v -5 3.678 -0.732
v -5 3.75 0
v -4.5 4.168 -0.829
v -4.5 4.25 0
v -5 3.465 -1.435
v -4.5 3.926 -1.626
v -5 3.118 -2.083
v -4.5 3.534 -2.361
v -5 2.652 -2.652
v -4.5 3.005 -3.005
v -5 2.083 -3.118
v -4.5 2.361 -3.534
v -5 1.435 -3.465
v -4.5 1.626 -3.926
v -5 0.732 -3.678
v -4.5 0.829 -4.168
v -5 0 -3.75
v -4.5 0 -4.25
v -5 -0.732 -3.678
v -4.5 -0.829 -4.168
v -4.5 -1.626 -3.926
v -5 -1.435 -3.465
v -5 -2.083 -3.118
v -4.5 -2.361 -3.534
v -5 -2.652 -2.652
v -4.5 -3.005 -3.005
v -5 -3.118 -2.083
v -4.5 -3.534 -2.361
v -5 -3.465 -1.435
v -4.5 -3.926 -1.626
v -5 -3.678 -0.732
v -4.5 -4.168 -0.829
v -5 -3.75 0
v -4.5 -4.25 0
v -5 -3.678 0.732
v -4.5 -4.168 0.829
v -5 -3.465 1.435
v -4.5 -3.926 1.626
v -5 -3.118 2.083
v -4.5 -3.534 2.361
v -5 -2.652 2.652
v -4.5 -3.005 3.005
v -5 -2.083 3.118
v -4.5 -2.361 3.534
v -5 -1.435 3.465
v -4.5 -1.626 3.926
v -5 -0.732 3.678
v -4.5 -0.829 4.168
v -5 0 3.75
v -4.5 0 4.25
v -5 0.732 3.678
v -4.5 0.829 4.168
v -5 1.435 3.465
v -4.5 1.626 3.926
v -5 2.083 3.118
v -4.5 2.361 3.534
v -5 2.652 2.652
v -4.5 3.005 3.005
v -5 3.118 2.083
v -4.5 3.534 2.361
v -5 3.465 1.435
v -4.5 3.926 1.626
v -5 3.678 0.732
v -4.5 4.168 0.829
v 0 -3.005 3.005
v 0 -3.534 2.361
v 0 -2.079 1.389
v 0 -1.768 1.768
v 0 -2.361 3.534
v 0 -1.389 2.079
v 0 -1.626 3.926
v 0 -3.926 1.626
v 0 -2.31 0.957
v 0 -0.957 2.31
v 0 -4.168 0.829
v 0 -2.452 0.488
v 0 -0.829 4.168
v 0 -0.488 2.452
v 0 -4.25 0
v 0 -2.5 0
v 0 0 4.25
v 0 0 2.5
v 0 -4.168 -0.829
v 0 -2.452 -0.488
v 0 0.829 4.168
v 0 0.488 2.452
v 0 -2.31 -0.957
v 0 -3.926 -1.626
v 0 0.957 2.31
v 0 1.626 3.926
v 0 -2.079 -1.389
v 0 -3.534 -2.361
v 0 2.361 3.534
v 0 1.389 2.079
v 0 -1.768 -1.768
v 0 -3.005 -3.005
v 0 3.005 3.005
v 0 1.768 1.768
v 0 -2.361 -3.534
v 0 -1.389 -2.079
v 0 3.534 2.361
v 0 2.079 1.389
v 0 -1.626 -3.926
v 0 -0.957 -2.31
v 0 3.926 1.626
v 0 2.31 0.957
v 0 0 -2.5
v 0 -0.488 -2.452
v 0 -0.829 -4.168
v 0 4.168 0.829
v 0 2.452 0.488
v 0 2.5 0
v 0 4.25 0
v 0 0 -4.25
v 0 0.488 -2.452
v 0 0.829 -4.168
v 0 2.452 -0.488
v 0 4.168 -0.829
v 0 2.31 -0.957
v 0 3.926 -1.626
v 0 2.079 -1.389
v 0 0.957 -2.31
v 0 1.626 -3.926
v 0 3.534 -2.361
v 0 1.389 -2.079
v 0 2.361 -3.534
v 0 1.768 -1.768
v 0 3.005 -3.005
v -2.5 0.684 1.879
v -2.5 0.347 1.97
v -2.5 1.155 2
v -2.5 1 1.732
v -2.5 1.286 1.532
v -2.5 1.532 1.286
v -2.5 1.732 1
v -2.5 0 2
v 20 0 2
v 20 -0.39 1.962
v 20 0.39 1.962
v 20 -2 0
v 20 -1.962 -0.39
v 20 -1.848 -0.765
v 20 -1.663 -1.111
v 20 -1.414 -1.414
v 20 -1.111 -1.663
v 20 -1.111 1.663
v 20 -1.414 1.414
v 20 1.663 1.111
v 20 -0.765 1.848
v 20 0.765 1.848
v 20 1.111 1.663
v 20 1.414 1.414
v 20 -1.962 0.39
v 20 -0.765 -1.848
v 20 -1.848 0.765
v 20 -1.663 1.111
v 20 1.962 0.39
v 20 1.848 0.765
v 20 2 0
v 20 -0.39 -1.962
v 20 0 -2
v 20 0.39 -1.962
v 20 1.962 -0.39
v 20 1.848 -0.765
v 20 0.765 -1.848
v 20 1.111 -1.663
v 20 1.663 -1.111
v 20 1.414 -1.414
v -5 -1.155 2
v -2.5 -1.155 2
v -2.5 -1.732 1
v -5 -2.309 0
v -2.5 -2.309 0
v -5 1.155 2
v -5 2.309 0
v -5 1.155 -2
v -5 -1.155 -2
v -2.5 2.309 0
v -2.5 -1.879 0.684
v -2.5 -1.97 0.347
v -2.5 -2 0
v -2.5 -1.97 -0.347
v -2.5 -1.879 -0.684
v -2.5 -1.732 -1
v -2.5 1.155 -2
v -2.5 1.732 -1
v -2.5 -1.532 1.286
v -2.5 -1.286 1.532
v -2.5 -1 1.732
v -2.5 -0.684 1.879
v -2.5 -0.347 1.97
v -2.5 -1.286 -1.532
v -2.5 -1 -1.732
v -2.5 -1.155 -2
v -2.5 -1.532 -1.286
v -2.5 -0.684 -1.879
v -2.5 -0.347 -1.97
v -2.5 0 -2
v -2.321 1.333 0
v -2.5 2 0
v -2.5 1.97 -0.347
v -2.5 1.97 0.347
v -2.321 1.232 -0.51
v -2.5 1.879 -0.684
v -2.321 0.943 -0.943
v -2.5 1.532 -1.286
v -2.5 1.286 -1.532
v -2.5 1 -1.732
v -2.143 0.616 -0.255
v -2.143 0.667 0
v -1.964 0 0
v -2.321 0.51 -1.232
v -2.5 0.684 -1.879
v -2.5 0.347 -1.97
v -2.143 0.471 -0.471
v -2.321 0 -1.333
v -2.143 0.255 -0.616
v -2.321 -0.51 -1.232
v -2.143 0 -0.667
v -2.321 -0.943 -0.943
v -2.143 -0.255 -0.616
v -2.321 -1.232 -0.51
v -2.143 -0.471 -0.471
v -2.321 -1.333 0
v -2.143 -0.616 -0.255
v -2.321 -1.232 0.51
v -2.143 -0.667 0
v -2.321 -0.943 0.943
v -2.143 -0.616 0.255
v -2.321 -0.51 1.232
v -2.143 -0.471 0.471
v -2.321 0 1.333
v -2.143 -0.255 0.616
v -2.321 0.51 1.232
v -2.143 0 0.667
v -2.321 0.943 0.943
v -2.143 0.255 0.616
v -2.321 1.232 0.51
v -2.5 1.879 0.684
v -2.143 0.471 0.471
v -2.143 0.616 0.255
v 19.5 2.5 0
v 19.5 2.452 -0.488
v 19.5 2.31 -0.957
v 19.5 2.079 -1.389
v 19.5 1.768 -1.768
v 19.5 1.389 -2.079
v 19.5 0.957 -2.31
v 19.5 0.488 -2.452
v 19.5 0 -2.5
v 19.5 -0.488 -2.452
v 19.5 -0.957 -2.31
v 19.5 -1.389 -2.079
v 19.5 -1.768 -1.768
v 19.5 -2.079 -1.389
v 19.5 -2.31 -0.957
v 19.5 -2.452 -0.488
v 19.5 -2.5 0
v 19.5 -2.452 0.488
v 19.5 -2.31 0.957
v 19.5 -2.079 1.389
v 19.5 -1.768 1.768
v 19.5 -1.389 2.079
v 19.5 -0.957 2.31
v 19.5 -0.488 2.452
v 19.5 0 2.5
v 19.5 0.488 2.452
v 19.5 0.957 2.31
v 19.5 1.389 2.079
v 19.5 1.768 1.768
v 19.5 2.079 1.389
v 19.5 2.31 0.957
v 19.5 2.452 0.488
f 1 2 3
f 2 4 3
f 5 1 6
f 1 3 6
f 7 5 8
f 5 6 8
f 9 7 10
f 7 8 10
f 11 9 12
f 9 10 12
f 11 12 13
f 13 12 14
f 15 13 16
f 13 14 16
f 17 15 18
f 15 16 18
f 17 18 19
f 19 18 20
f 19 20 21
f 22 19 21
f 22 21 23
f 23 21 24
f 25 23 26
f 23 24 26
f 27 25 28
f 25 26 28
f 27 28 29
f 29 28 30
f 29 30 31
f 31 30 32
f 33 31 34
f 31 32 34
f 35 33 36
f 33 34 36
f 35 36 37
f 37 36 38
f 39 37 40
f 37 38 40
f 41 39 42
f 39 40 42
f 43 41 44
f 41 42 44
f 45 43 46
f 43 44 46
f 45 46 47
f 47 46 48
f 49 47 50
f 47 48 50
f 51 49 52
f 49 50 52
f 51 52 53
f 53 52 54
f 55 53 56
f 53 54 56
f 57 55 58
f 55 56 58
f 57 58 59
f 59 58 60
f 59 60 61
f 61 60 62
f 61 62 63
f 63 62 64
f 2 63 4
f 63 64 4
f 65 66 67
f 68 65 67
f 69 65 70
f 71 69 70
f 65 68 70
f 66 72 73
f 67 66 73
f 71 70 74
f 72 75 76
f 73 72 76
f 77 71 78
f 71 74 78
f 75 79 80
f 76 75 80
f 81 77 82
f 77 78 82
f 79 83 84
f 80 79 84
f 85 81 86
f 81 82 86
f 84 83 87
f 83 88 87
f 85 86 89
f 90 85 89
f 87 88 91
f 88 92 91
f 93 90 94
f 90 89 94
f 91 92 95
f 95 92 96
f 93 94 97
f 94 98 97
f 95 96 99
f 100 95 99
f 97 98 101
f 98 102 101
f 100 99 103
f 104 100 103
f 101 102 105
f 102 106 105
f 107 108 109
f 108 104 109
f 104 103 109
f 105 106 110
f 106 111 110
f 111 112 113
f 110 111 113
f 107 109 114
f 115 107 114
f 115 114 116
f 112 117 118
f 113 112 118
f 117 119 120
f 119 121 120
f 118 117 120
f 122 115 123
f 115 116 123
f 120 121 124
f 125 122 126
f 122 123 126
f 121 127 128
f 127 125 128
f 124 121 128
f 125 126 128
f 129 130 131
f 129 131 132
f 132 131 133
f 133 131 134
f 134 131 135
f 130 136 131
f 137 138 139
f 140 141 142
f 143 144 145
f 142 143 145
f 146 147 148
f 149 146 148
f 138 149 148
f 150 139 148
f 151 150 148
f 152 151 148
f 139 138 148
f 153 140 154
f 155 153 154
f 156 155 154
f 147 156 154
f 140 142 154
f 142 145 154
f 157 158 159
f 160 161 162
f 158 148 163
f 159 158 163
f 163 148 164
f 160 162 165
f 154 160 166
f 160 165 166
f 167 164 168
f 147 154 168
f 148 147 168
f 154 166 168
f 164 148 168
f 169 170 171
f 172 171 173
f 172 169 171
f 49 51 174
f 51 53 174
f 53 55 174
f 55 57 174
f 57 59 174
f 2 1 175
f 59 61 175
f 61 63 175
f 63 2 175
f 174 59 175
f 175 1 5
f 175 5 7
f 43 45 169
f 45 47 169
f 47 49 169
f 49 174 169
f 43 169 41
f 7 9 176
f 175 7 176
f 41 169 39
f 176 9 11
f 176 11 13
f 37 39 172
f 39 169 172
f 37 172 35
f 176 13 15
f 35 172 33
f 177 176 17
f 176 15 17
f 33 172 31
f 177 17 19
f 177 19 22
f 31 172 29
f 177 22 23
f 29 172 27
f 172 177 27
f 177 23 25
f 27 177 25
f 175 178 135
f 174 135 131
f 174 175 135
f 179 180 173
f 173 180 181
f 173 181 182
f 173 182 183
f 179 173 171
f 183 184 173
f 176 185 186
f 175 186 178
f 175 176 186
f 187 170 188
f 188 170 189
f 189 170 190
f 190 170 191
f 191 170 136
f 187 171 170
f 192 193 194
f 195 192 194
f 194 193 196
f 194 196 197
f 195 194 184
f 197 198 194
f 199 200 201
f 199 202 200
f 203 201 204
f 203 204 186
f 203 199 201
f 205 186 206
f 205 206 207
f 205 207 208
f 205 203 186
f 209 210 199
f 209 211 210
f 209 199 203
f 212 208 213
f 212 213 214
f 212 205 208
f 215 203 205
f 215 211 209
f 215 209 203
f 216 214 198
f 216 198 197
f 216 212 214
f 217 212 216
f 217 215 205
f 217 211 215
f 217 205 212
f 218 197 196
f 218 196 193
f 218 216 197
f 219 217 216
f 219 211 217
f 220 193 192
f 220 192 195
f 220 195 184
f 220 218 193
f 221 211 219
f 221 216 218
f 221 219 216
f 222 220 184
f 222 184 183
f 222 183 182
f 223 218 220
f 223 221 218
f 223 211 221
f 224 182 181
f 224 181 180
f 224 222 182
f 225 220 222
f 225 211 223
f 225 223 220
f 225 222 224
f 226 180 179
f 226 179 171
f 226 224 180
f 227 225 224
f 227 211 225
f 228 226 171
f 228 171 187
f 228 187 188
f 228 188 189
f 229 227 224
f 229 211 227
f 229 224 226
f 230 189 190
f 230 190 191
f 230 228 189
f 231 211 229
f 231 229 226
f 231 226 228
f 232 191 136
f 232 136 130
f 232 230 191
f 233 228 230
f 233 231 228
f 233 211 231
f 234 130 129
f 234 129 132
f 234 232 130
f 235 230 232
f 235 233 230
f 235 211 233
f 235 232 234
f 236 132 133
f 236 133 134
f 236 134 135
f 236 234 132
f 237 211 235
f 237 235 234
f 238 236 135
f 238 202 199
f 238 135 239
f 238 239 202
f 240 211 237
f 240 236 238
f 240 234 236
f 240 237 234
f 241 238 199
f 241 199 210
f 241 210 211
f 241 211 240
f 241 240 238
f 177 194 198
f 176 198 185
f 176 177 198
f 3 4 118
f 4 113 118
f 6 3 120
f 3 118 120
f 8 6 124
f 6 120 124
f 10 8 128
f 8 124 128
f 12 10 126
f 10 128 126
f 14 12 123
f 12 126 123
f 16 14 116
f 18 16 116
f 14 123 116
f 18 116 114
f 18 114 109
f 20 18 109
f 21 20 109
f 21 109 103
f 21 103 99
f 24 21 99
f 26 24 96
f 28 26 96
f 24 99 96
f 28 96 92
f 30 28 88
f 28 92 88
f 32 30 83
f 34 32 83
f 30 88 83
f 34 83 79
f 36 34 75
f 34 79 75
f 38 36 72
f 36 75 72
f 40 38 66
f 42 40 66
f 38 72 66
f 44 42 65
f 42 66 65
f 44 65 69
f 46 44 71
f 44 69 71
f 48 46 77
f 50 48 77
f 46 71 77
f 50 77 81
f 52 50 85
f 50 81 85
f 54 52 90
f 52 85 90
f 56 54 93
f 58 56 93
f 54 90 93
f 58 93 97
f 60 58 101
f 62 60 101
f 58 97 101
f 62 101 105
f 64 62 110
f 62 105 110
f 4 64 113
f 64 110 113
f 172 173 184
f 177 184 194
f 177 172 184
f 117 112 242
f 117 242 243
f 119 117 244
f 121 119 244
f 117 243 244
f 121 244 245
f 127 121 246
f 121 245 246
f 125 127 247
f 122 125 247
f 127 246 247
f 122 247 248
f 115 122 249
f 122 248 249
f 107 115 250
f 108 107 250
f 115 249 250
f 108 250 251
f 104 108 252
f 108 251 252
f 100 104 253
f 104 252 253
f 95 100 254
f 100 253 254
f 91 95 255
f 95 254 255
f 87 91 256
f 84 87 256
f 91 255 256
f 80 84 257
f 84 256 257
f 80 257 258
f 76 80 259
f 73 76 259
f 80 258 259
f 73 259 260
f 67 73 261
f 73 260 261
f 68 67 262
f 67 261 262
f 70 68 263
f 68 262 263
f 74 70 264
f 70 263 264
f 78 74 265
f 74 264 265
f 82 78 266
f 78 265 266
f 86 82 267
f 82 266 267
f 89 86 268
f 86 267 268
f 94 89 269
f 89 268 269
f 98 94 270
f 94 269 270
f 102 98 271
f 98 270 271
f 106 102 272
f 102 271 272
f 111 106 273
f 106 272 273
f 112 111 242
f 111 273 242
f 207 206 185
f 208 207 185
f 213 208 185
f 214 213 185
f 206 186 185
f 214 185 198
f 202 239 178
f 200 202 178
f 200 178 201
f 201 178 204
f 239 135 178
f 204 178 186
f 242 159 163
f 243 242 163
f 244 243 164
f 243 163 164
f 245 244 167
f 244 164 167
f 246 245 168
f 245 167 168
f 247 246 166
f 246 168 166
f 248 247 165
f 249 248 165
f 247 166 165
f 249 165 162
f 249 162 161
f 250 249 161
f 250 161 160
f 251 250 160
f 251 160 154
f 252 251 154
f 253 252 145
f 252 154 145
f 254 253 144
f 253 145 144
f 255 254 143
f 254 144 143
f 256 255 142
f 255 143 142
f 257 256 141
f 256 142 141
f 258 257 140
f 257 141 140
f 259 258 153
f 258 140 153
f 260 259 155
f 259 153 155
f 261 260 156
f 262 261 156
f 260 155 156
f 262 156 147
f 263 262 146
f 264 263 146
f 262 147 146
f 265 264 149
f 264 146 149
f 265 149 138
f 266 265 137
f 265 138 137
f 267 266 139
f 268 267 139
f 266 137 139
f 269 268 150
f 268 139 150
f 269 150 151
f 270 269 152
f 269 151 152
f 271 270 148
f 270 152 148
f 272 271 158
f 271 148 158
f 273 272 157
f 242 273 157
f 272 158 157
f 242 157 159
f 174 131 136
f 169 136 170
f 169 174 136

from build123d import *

# Parameters (mm, degrees)
CHAMFER1_SIZE      = 0.5
CUT_EXTRUDE1_DEPTH = 2.5


with BuildPart() as part:
    # Sketch1 → Revolve1 (revolve)
    with BuildSketch(Plane.XY):
        Polygon((-5, 0), (-5, 3.75), (-4.5, 4.25), (0, 4.25), (0, 2.5), (20, 2.5), (20, 0), align=None)
    revolve(axis=Axis((20, 0, 0), (-1, 0, 0)))

    # Chamfer1
    chamfer1_edges = [part.edges().sort_by_distance(p)[0] for p in [
        (20, -2.5, 0),
    ]]
    chamfer(chamfer1_edges, length=CHAMFER1_SIZE)

    # Sketch2 → Cut-Revolve1 (revolve, cut)
    with BuildSketch(Plane.XY):
        Polygon((-5, 0), (-5, 2), (-2.5, 2), (-1.964101615, 0), align=None)
    revolve(axis=Axis((-1.964101615, 0, 0), (-1, 0, 0)), mode=Mode.SUBTRACT)

    # Sketch3 → Cut-Extrude1 (cut)
    with BuildSketch(Plane(origin=(-5, 0, 0), x_dir=(0, 0, -1), z_dir=(1, 0, 0))):
        Polygon((-2, 1.154700538), (-2, -1.154700538), (0, -2.309401077), (2, -1.154700538), (2, 1.154700538), (0, 2.309401077), align=None)
    extrude(amount=CUT_EXTRUDE1_DEPTH, mode=Mode.SUBTRACT)


solid = part.part
